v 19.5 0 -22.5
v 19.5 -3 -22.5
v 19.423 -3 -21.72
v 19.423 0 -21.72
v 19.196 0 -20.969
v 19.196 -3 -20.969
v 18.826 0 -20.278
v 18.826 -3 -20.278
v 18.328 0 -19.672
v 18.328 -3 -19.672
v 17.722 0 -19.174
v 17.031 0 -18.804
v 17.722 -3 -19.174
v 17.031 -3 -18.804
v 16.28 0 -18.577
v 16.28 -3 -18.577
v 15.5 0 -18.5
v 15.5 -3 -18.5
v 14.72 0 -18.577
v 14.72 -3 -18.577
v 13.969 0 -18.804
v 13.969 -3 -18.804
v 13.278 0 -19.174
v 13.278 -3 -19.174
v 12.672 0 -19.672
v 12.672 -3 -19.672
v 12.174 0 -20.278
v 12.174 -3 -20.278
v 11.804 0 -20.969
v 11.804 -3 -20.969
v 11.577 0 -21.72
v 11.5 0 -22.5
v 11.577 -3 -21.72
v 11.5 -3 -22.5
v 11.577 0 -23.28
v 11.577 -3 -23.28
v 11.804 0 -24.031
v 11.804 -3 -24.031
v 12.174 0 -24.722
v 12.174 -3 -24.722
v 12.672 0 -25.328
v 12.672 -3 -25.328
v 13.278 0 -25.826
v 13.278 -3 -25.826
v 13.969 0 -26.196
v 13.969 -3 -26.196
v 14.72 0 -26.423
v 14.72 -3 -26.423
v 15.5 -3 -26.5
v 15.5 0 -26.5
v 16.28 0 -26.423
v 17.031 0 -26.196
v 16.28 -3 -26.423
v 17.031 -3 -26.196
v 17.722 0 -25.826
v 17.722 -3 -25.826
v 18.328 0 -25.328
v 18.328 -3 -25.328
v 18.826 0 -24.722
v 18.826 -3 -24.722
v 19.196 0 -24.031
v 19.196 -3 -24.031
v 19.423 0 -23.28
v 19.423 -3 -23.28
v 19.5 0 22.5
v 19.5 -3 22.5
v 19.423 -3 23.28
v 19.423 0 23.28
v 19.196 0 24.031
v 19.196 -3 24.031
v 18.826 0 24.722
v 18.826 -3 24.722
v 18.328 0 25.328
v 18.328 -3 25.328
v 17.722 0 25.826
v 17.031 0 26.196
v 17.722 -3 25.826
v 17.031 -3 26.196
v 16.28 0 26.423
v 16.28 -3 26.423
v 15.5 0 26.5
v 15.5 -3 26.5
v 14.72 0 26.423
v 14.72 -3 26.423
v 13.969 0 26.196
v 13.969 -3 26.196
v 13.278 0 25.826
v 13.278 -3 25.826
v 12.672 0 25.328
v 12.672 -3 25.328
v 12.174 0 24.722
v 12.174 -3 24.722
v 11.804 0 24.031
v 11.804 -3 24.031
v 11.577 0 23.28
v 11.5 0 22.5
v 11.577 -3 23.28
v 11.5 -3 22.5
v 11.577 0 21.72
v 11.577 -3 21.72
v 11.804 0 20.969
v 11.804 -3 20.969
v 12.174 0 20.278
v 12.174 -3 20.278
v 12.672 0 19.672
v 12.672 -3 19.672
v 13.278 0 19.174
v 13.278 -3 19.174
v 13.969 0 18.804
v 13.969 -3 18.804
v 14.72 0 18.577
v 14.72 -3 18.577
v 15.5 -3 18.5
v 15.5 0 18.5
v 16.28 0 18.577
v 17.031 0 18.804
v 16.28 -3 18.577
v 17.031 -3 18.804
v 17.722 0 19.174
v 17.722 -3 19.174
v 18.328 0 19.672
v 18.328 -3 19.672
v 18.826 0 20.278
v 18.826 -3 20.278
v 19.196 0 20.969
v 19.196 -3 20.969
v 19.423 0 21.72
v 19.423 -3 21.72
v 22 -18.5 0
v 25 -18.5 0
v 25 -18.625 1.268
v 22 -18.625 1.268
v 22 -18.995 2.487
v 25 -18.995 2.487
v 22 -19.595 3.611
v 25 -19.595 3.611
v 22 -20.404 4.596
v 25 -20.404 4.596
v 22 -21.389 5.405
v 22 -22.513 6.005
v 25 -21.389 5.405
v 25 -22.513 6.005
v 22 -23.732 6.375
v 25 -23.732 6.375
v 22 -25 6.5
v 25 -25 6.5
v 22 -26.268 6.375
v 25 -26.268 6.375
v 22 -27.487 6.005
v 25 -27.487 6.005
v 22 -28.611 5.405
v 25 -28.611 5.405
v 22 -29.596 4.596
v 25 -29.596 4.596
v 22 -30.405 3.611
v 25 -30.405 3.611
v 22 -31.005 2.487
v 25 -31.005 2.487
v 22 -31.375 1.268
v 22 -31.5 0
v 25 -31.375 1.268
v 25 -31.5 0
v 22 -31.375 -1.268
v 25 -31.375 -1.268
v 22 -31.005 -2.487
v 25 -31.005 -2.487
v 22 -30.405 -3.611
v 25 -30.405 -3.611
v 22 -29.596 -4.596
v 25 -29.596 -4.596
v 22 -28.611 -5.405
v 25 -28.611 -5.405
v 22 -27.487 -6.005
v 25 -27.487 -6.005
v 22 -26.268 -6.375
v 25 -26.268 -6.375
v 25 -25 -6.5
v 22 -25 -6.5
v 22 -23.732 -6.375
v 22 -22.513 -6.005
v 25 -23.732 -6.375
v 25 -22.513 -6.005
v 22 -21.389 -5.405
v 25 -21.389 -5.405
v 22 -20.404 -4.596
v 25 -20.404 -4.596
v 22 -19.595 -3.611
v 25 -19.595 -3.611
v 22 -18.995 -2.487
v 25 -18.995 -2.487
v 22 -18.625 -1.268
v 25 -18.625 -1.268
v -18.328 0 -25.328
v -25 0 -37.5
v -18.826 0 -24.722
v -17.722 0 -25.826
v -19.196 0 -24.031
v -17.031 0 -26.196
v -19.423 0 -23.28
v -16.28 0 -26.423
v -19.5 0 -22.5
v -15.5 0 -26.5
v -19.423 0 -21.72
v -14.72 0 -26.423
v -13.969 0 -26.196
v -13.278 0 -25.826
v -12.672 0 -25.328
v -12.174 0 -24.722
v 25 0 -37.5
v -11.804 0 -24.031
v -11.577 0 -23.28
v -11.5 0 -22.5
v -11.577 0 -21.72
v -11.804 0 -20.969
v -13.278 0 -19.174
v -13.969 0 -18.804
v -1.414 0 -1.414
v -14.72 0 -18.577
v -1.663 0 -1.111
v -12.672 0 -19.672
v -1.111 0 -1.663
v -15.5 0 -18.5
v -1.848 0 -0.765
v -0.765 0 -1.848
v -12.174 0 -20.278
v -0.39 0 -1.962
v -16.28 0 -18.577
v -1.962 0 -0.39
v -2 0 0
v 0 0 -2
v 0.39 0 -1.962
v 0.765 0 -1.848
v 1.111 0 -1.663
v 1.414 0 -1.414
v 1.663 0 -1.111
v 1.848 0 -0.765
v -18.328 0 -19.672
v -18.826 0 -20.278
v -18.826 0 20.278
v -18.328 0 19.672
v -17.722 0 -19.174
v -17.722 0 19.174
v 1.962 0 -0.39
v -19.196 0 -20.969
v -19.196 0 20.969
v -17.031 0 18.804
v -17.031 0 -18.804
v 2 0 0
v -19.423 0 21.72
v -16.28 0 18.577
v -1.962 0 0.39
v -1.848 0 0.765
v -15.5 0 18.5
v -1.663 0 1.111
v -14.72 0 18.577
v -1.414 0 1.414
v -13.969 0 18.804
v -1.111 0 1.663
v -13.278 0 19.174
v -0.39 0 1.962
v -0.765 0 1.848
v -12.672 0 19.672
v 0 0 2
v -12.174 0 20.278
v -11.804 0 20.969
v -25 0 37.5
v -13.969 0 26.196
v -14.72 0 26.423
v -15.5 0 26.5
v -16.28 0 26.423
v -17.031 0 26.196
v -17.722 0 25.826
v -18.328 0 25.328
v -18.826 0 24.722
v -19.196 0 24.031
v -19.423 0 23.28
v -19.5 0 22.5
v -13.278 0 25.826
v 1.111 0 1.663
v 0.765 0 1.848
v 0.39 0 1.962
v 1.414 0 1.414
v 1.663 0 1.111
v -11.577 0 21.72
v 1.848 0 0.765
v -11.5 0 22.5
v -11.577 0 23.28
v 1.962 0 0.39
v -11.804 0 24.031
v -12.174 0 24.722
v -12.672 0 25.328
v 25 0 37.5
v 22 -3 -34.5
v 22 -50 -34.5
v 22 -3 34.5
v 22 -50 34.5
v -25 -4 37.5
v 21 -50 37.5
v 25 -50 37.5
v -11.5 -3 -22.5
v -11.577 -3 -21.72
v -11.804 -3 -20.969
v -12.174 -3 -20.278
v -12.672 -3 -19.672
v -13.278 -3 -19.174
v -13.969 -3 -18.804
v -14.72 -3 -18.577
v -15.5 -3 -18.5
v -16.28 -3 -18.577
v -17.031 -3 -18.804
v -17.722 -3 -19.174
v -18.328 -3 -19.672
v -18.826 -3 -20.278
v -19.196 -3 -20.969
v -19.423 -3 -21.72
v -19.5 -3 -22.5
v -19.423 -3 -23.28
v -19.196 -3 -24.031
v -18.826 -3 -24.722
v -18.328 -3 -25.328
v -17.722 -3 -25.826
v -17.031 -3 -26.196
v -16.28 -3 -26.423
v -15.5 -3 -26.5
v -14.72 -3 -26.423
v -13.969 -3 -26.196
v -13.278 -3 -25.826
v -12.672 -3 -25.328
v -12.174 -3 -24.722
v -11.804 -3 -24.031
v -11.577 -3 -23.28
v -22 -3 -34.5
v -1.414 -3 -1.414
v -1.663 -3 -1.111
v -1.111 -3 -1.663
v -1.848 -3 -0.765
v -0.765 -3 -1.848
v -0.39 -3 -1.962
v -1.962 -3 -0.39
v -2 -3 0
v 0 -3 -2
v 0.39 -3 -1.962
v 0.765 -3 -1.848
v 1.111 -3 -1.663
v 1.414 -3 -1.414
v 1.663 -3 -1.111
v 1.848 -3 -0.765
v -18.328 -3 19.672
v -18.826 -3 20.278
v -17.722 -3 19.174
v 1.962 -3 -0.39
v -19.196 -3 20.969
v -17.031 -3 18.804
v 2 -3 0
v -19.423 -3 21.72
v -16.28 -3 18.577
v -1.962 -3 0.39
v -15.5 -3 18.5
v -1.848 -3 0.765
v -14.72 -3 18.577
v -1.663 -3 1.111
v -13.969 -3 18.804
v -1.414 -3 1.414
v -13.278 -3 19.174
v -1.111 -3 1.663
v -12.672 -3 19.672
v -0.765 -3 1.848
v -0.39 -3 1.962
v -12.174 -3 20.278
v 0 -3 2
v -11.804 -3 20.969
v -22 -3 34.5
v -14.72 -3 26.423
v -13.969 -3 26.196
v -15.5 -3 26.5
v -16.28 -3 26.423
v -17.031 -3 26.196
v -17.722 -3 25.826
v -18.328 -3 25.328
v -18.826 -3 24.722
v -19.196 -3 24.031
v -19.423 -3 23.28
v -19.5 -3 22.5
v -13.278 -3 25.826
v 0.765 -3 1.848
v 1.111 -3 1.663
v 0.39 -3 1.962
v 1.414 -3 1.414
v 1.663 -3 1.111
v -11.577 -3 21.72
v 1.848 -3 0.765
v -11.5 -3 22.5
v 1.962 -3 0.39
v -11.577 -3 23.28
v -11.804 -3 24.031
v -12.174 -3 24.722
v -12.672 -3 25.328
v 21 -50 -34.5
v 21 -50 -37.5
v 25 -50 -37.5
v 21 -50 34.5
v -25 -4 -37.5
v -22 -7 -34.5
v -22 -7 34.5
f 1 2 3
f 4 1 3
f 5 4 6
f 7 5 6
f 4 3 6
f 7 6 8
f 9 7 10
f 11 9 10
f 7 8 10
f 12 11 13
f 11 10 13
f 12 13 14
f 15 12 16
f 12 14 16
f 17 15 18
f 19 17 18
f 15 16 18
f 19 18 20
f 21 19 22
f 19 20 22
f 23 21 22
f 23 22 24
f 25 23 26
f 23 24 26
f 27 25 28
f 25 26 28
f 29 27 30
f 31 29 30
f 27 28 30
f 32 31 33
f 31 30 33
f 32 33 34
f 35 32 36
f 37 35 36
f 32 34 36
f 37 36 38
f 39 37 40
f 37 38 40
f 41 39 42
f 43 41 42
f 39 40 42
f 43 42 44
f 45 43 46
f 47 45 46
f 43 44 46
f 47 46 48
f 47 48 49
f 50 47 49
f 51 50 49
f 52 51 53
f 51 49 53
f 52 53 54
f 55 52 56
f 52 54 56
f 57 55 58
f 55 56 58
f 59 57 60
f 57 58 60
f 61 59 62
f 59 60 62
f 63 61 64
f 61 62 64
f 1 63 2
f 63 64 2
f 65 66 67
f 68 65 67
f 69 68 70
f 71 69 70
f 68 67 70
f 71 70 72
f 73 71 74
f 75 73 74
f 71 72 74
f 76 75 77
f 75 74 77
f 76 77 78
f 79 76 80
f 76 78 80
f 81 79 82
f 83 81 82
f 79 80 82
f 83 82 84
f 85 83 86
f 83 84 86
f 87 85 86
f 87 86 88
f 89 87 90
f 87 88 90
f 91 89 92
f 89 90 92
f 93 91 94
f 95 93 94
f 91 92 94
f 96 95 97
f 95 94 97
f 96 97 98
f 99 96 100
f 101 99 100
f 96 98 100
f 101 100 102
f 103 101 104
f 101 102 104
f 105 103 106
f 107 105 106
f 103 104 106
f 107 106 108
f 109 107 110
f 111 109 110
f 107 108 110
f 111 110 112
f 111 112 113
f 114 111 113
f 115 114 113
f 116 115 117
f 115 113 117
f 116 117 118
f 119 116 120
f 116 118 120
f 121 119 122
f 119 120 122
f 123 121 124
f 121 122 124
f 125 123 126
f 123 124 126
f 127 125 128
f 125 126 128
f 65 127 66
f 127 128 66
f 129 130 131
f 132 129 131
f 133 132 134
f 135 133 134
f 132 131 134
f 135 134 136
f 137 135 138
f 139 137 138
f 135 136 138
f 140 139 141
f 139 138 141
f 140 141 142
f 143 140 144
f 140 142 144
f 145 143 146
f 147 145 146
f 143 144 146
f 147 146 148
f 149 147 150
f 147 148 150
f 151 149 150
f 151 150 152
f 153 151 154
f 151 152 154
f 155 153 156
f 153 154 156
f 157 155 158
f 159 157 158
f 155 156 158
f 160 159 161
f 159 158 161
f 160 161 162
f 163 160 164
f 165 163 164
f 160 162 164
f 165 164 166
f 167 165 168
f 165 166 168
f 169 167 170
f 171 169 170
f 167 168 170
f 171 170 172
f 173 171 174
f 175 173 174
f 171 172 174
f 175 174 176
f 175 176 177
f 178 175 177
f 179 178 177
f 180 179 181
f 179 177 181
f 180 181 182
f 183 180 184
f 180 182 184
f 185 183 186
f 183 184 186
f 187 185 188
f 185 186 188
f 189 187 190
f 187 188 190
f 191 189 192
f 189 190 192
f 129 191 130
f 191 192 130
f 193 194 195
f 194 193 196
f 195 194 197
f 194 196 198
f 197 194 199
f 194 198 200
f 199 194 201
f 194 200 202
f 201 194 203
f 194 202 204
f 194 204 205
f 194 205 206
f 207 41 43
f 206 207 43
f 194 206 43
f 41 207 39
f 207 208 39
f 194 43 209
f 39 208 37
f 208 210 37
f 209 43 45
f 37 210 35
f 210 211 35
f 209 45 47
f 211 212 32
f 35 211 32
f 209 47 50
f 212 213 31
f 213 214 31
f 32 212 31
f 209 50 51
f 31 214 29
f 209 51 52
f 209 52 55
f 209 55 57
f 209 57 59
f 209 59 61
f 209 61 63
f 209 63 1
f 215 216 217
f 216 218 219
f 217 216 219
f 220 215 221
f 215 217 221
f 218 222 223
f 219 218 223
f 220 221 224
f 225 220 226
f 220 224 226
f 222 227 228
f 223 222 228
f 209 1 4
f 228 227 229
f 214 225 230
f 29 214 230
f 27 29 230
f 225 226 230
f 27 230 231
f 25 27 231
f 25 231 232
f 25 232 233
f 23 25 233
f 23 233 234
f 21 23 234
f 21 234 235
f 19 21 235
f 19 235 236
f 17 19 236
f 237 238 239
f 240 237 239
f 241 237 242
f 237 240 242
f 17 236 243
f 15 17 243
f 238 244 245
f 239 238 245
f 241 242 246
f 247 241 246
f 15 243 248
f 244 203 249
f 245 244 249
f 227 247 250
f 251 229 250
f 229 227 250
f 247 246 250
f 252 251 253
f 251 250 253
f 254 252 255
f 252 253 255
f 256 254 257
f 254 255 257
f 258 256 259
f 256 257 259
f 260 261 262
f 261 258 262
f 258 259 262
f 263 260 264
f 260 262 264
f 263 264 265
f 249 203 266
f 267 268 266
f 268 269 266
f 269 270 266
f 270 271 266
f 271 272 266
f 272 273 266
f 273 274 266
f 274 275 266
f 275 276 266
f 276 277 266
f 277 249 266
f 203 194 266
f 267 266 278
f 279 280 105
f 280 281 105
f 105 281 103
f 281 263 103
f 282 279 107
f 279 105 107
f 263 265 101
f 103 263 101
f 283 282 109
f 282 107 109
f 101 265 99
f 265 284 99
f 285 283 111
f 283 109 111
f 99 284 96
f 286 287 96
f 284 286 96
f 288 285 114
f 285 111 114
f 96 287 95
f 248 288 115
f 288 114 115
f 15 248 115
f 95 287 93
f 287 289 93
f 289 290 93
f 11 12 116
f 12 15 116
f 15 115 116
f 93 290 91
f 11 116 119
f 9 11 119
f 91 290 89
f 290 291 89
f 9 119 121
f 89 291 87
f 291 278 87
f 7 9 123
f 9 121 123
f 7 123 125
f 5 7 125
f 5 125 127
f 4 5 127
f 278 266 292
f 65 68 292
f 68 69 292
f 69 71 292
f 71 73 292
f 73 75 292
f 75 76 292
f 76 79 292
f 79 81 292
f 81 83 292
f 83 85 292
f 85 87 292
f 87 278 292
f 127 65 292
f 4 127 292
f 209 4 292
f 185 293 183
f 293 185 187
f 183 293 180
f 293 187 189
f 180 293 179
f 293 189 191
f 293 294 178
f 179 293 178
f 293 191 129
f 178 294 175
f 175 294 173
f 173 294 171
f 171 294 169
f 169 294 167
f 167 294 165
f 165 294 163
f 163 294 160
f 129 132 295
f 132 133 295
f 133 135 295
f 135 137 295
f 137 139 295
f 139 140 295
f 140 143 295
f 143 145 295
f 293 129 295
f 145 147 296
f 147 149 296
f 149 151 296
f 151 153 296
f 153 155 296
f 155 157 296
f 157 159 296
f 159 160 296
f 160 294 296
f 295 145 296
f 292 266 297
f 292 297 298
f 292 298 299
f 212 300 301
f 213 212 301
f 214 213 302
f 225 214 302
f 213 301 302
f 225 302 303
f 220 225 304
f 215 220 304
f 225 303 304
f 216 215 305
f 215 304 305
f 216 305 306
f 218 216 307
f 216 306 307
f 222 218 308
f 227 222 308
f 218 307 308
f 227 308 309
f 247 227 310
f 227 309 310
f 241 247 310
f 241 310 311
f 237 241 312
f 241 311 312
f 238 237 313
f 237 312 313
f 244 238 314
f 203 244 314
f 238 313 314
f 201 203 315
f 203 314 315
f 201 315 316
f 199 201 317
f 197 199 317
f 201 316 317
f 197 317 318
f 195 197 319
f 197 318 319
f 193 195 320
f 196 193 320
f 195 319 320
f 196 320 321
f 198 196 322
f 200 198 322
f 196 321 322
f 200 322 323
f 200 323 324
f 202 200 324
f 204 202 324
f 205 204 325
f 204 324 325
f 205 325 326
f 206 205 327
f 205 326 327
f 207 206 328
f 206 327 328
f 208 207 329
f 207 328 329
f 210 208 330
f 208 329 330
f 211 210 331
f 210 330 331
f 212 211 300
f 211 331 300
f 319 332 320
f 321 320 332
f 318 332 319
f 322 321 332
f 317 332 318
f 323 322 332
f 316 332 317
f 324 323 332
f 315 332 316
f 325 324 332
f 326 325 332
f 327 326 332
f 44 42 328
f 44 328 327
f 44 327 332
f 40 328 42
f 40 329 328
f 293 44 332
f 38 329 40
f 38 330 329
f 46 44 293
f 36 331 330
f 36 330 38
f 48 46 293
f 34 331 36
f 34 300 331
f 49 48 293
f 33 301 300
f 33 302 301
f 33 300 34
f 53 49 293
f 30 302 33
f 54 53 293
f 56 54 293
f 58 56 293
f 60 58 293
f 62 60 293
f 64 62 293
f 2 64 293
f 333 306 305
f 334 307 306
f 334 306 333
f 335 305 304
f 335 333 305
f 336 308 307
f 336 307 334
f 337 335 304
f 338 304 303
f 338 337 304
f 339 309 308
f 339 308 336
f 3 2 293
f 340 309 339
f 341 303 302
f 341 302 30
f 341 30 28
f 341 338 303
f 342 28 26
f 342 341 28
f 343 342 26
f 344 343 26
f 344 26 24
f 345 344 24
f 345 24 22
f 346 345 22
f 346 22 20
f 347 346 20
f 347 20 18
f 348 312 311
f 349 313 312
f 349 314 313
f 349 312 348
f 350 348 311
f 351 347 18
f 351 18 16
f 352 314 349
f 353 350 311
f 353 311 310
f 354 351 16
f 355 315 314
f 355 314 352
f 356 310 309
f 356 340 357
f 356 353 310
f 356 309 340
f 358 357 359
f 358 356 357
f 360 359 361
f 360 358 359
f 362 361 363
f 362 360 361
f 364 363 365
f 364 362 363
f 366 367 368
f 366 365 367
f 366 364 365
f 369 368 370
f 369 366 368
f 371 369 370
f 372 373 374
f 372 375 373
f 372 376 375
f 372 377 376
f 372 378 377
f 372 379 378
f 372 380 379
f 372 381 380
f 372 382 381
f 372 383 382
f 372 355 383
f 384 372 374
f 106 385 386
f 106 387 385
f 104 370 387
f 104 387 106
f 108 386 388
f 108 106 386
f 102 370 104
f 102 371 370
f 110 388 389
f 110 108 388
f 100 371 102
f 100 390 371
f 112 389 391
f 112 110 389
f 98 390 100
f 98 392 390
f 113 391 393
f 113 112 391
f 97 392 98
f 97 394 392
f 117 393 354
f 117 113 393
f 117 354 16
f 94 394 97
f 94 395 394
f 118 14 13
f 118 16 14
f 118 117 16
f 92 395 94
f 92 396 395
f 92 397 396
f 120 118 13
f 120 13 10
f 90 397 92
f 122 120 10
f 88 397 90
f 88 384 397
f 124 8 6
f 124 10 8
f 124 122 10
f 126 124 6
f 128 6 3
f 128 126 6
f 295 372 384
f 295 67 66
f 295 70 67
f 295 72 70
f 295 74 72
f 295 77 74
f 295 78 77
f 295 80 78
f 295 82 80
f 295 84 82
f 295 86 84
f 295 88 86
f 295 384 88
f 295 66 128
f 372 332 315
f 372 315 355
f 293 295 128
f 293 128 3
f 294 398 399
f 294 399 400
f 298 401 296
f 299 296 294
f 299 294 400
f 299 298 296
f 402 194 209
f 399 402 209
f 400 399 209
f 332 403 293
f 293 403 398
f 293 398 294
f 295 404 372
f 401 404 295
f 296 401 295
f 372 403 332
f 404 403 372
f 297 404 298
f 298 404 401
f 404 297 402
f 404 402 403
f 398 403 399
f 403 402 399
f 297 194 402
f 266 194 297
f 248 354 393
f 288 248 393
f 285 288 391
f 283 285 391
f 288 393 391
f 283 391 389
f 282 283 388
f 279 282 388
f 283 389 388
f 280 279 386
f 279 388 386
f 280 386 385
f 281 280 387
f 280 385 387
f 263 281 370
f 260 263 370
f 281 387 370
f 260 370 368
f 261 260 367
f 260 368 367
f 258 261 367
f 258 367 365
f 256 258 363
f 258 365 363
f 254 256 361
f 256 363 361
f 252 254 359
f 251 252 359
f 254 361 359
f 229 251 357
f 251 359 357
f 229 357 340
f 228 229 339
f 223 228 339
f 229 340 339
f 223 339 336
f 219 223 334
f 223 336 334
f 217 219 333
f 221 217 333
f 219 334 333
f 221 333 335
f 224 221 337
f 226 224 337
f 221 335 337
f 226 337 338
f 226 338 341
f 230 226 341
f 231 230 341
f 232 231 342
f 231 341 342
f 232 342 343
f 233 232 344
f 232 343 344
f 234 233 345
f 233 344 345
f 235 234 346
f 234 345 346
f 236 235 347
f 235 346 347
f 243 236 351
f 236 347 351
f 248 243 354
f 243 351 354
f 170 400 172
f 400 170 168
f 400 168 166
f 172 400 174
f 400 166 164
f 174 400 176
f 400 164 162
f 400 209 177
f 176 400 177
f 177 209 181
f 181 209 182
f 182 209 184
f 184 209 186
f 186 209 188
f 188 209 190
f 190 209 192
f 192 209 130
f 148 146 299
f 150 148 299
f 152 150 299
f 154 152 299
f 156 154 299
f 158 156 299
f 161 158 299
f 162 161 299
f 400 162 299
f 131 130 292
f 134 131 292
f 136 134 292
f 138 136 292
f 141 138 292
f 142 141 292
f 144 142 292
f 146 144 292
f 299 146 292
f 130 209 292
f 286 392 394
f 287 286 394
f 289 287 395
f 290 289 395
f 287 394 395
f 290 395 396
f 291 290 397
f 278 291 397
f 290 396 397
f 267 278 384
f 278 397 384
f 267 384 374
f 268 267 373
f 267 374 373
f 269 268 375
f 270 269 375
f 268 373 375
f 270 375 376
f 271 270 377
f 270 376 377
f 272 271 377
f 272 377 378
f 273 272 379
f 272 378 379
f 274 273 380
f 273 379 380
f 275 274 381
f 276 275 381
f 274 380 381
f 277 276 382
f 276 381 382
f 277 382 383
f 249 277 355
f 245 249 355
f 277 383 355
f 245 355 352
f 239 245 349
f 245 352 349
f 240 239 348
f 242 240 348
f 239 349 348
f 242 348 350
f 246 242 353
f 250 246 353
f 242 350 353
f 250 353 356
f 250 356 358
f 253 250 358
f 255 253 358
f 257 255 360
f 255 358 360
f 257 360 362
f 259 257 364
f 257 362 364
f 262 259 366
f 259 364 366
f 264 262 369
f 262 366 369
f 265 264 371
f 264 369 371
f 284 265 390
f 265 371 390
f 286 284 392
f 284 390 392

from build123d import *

# Parameters (mm, degrees)
F0_W        = 50
F0_H        = 75
F1_DEPTH    = 50
F2_W        = 44
F2_H        = 69
F3_DEPTH    = 47
F4_T1_DEPTH = 311.5948348929
F5_R        = 4
F5_R_2      = 2
F6_DEPTH    = 3
F7_R        = 6.5
F8_DEPTH    = 3


# Not quite as in the source:
# - a fillet or chamfer that OpenCascade refuses, or shapes differently, is made with other operations: its cross-section is extruded or revolved along the edge and cut away or added


with BuildPart() as f1:
    # F0 (on Front) → F1 (new body)
    with BuildSketch(Plane.XZ):
        Rectangle(F0_W, F0_H)
    extrude(amount=F1_DEPTH)

    # F2 (on face) → F3 (cut)
    with BuildSketch(Plane.XZ.offset(50)):
        Rectangle(F2_W, F2_H)
    extrude(amount=-F3_DEPTH, mode=Mode.SUBTRACT)

    # F4: chamfer of 46 on 1 edges, made by hand

    # F4_s2 → F4_t1 (cut)
    with BuildSketch(Plane.XY.offset(-155.7974174464)):
        Polygon((-25, -4), (21, -50), (-25, -50), align=None)
    extrude(amount=F4_T1_DEPTH, mode=Mode.SUBTRACT)

    # F5 (on face) → F6 (cut, through all)
    with BuildSketch(Plane.XZ.offset(3)):
        with Locations((-15.5, 22.5)):
            Circle(F5_R)
        with Locations((15.5, 22.5)):
            Circle(F5_R)
        with Locations((15.5, -22.5)):
            Circle(F5_R)
        with Locations((-15.5, -22.5)):
            Circle(F5_R)
        Circle(F5_R_2)
    extrude(amount=-F6_DEPTH, mode=Mode.SUBTRACT)

    # F7 (on face) → F8 (cut, through all)
    with BuildSketch(Plane.YZ.offset(25)):
        with Locations((-25, 0)):
            Circle(F7_R)
    extrude(amount=-F8_DEPTH, mode=Mode.SUBTRACT)


solid = f1.part
